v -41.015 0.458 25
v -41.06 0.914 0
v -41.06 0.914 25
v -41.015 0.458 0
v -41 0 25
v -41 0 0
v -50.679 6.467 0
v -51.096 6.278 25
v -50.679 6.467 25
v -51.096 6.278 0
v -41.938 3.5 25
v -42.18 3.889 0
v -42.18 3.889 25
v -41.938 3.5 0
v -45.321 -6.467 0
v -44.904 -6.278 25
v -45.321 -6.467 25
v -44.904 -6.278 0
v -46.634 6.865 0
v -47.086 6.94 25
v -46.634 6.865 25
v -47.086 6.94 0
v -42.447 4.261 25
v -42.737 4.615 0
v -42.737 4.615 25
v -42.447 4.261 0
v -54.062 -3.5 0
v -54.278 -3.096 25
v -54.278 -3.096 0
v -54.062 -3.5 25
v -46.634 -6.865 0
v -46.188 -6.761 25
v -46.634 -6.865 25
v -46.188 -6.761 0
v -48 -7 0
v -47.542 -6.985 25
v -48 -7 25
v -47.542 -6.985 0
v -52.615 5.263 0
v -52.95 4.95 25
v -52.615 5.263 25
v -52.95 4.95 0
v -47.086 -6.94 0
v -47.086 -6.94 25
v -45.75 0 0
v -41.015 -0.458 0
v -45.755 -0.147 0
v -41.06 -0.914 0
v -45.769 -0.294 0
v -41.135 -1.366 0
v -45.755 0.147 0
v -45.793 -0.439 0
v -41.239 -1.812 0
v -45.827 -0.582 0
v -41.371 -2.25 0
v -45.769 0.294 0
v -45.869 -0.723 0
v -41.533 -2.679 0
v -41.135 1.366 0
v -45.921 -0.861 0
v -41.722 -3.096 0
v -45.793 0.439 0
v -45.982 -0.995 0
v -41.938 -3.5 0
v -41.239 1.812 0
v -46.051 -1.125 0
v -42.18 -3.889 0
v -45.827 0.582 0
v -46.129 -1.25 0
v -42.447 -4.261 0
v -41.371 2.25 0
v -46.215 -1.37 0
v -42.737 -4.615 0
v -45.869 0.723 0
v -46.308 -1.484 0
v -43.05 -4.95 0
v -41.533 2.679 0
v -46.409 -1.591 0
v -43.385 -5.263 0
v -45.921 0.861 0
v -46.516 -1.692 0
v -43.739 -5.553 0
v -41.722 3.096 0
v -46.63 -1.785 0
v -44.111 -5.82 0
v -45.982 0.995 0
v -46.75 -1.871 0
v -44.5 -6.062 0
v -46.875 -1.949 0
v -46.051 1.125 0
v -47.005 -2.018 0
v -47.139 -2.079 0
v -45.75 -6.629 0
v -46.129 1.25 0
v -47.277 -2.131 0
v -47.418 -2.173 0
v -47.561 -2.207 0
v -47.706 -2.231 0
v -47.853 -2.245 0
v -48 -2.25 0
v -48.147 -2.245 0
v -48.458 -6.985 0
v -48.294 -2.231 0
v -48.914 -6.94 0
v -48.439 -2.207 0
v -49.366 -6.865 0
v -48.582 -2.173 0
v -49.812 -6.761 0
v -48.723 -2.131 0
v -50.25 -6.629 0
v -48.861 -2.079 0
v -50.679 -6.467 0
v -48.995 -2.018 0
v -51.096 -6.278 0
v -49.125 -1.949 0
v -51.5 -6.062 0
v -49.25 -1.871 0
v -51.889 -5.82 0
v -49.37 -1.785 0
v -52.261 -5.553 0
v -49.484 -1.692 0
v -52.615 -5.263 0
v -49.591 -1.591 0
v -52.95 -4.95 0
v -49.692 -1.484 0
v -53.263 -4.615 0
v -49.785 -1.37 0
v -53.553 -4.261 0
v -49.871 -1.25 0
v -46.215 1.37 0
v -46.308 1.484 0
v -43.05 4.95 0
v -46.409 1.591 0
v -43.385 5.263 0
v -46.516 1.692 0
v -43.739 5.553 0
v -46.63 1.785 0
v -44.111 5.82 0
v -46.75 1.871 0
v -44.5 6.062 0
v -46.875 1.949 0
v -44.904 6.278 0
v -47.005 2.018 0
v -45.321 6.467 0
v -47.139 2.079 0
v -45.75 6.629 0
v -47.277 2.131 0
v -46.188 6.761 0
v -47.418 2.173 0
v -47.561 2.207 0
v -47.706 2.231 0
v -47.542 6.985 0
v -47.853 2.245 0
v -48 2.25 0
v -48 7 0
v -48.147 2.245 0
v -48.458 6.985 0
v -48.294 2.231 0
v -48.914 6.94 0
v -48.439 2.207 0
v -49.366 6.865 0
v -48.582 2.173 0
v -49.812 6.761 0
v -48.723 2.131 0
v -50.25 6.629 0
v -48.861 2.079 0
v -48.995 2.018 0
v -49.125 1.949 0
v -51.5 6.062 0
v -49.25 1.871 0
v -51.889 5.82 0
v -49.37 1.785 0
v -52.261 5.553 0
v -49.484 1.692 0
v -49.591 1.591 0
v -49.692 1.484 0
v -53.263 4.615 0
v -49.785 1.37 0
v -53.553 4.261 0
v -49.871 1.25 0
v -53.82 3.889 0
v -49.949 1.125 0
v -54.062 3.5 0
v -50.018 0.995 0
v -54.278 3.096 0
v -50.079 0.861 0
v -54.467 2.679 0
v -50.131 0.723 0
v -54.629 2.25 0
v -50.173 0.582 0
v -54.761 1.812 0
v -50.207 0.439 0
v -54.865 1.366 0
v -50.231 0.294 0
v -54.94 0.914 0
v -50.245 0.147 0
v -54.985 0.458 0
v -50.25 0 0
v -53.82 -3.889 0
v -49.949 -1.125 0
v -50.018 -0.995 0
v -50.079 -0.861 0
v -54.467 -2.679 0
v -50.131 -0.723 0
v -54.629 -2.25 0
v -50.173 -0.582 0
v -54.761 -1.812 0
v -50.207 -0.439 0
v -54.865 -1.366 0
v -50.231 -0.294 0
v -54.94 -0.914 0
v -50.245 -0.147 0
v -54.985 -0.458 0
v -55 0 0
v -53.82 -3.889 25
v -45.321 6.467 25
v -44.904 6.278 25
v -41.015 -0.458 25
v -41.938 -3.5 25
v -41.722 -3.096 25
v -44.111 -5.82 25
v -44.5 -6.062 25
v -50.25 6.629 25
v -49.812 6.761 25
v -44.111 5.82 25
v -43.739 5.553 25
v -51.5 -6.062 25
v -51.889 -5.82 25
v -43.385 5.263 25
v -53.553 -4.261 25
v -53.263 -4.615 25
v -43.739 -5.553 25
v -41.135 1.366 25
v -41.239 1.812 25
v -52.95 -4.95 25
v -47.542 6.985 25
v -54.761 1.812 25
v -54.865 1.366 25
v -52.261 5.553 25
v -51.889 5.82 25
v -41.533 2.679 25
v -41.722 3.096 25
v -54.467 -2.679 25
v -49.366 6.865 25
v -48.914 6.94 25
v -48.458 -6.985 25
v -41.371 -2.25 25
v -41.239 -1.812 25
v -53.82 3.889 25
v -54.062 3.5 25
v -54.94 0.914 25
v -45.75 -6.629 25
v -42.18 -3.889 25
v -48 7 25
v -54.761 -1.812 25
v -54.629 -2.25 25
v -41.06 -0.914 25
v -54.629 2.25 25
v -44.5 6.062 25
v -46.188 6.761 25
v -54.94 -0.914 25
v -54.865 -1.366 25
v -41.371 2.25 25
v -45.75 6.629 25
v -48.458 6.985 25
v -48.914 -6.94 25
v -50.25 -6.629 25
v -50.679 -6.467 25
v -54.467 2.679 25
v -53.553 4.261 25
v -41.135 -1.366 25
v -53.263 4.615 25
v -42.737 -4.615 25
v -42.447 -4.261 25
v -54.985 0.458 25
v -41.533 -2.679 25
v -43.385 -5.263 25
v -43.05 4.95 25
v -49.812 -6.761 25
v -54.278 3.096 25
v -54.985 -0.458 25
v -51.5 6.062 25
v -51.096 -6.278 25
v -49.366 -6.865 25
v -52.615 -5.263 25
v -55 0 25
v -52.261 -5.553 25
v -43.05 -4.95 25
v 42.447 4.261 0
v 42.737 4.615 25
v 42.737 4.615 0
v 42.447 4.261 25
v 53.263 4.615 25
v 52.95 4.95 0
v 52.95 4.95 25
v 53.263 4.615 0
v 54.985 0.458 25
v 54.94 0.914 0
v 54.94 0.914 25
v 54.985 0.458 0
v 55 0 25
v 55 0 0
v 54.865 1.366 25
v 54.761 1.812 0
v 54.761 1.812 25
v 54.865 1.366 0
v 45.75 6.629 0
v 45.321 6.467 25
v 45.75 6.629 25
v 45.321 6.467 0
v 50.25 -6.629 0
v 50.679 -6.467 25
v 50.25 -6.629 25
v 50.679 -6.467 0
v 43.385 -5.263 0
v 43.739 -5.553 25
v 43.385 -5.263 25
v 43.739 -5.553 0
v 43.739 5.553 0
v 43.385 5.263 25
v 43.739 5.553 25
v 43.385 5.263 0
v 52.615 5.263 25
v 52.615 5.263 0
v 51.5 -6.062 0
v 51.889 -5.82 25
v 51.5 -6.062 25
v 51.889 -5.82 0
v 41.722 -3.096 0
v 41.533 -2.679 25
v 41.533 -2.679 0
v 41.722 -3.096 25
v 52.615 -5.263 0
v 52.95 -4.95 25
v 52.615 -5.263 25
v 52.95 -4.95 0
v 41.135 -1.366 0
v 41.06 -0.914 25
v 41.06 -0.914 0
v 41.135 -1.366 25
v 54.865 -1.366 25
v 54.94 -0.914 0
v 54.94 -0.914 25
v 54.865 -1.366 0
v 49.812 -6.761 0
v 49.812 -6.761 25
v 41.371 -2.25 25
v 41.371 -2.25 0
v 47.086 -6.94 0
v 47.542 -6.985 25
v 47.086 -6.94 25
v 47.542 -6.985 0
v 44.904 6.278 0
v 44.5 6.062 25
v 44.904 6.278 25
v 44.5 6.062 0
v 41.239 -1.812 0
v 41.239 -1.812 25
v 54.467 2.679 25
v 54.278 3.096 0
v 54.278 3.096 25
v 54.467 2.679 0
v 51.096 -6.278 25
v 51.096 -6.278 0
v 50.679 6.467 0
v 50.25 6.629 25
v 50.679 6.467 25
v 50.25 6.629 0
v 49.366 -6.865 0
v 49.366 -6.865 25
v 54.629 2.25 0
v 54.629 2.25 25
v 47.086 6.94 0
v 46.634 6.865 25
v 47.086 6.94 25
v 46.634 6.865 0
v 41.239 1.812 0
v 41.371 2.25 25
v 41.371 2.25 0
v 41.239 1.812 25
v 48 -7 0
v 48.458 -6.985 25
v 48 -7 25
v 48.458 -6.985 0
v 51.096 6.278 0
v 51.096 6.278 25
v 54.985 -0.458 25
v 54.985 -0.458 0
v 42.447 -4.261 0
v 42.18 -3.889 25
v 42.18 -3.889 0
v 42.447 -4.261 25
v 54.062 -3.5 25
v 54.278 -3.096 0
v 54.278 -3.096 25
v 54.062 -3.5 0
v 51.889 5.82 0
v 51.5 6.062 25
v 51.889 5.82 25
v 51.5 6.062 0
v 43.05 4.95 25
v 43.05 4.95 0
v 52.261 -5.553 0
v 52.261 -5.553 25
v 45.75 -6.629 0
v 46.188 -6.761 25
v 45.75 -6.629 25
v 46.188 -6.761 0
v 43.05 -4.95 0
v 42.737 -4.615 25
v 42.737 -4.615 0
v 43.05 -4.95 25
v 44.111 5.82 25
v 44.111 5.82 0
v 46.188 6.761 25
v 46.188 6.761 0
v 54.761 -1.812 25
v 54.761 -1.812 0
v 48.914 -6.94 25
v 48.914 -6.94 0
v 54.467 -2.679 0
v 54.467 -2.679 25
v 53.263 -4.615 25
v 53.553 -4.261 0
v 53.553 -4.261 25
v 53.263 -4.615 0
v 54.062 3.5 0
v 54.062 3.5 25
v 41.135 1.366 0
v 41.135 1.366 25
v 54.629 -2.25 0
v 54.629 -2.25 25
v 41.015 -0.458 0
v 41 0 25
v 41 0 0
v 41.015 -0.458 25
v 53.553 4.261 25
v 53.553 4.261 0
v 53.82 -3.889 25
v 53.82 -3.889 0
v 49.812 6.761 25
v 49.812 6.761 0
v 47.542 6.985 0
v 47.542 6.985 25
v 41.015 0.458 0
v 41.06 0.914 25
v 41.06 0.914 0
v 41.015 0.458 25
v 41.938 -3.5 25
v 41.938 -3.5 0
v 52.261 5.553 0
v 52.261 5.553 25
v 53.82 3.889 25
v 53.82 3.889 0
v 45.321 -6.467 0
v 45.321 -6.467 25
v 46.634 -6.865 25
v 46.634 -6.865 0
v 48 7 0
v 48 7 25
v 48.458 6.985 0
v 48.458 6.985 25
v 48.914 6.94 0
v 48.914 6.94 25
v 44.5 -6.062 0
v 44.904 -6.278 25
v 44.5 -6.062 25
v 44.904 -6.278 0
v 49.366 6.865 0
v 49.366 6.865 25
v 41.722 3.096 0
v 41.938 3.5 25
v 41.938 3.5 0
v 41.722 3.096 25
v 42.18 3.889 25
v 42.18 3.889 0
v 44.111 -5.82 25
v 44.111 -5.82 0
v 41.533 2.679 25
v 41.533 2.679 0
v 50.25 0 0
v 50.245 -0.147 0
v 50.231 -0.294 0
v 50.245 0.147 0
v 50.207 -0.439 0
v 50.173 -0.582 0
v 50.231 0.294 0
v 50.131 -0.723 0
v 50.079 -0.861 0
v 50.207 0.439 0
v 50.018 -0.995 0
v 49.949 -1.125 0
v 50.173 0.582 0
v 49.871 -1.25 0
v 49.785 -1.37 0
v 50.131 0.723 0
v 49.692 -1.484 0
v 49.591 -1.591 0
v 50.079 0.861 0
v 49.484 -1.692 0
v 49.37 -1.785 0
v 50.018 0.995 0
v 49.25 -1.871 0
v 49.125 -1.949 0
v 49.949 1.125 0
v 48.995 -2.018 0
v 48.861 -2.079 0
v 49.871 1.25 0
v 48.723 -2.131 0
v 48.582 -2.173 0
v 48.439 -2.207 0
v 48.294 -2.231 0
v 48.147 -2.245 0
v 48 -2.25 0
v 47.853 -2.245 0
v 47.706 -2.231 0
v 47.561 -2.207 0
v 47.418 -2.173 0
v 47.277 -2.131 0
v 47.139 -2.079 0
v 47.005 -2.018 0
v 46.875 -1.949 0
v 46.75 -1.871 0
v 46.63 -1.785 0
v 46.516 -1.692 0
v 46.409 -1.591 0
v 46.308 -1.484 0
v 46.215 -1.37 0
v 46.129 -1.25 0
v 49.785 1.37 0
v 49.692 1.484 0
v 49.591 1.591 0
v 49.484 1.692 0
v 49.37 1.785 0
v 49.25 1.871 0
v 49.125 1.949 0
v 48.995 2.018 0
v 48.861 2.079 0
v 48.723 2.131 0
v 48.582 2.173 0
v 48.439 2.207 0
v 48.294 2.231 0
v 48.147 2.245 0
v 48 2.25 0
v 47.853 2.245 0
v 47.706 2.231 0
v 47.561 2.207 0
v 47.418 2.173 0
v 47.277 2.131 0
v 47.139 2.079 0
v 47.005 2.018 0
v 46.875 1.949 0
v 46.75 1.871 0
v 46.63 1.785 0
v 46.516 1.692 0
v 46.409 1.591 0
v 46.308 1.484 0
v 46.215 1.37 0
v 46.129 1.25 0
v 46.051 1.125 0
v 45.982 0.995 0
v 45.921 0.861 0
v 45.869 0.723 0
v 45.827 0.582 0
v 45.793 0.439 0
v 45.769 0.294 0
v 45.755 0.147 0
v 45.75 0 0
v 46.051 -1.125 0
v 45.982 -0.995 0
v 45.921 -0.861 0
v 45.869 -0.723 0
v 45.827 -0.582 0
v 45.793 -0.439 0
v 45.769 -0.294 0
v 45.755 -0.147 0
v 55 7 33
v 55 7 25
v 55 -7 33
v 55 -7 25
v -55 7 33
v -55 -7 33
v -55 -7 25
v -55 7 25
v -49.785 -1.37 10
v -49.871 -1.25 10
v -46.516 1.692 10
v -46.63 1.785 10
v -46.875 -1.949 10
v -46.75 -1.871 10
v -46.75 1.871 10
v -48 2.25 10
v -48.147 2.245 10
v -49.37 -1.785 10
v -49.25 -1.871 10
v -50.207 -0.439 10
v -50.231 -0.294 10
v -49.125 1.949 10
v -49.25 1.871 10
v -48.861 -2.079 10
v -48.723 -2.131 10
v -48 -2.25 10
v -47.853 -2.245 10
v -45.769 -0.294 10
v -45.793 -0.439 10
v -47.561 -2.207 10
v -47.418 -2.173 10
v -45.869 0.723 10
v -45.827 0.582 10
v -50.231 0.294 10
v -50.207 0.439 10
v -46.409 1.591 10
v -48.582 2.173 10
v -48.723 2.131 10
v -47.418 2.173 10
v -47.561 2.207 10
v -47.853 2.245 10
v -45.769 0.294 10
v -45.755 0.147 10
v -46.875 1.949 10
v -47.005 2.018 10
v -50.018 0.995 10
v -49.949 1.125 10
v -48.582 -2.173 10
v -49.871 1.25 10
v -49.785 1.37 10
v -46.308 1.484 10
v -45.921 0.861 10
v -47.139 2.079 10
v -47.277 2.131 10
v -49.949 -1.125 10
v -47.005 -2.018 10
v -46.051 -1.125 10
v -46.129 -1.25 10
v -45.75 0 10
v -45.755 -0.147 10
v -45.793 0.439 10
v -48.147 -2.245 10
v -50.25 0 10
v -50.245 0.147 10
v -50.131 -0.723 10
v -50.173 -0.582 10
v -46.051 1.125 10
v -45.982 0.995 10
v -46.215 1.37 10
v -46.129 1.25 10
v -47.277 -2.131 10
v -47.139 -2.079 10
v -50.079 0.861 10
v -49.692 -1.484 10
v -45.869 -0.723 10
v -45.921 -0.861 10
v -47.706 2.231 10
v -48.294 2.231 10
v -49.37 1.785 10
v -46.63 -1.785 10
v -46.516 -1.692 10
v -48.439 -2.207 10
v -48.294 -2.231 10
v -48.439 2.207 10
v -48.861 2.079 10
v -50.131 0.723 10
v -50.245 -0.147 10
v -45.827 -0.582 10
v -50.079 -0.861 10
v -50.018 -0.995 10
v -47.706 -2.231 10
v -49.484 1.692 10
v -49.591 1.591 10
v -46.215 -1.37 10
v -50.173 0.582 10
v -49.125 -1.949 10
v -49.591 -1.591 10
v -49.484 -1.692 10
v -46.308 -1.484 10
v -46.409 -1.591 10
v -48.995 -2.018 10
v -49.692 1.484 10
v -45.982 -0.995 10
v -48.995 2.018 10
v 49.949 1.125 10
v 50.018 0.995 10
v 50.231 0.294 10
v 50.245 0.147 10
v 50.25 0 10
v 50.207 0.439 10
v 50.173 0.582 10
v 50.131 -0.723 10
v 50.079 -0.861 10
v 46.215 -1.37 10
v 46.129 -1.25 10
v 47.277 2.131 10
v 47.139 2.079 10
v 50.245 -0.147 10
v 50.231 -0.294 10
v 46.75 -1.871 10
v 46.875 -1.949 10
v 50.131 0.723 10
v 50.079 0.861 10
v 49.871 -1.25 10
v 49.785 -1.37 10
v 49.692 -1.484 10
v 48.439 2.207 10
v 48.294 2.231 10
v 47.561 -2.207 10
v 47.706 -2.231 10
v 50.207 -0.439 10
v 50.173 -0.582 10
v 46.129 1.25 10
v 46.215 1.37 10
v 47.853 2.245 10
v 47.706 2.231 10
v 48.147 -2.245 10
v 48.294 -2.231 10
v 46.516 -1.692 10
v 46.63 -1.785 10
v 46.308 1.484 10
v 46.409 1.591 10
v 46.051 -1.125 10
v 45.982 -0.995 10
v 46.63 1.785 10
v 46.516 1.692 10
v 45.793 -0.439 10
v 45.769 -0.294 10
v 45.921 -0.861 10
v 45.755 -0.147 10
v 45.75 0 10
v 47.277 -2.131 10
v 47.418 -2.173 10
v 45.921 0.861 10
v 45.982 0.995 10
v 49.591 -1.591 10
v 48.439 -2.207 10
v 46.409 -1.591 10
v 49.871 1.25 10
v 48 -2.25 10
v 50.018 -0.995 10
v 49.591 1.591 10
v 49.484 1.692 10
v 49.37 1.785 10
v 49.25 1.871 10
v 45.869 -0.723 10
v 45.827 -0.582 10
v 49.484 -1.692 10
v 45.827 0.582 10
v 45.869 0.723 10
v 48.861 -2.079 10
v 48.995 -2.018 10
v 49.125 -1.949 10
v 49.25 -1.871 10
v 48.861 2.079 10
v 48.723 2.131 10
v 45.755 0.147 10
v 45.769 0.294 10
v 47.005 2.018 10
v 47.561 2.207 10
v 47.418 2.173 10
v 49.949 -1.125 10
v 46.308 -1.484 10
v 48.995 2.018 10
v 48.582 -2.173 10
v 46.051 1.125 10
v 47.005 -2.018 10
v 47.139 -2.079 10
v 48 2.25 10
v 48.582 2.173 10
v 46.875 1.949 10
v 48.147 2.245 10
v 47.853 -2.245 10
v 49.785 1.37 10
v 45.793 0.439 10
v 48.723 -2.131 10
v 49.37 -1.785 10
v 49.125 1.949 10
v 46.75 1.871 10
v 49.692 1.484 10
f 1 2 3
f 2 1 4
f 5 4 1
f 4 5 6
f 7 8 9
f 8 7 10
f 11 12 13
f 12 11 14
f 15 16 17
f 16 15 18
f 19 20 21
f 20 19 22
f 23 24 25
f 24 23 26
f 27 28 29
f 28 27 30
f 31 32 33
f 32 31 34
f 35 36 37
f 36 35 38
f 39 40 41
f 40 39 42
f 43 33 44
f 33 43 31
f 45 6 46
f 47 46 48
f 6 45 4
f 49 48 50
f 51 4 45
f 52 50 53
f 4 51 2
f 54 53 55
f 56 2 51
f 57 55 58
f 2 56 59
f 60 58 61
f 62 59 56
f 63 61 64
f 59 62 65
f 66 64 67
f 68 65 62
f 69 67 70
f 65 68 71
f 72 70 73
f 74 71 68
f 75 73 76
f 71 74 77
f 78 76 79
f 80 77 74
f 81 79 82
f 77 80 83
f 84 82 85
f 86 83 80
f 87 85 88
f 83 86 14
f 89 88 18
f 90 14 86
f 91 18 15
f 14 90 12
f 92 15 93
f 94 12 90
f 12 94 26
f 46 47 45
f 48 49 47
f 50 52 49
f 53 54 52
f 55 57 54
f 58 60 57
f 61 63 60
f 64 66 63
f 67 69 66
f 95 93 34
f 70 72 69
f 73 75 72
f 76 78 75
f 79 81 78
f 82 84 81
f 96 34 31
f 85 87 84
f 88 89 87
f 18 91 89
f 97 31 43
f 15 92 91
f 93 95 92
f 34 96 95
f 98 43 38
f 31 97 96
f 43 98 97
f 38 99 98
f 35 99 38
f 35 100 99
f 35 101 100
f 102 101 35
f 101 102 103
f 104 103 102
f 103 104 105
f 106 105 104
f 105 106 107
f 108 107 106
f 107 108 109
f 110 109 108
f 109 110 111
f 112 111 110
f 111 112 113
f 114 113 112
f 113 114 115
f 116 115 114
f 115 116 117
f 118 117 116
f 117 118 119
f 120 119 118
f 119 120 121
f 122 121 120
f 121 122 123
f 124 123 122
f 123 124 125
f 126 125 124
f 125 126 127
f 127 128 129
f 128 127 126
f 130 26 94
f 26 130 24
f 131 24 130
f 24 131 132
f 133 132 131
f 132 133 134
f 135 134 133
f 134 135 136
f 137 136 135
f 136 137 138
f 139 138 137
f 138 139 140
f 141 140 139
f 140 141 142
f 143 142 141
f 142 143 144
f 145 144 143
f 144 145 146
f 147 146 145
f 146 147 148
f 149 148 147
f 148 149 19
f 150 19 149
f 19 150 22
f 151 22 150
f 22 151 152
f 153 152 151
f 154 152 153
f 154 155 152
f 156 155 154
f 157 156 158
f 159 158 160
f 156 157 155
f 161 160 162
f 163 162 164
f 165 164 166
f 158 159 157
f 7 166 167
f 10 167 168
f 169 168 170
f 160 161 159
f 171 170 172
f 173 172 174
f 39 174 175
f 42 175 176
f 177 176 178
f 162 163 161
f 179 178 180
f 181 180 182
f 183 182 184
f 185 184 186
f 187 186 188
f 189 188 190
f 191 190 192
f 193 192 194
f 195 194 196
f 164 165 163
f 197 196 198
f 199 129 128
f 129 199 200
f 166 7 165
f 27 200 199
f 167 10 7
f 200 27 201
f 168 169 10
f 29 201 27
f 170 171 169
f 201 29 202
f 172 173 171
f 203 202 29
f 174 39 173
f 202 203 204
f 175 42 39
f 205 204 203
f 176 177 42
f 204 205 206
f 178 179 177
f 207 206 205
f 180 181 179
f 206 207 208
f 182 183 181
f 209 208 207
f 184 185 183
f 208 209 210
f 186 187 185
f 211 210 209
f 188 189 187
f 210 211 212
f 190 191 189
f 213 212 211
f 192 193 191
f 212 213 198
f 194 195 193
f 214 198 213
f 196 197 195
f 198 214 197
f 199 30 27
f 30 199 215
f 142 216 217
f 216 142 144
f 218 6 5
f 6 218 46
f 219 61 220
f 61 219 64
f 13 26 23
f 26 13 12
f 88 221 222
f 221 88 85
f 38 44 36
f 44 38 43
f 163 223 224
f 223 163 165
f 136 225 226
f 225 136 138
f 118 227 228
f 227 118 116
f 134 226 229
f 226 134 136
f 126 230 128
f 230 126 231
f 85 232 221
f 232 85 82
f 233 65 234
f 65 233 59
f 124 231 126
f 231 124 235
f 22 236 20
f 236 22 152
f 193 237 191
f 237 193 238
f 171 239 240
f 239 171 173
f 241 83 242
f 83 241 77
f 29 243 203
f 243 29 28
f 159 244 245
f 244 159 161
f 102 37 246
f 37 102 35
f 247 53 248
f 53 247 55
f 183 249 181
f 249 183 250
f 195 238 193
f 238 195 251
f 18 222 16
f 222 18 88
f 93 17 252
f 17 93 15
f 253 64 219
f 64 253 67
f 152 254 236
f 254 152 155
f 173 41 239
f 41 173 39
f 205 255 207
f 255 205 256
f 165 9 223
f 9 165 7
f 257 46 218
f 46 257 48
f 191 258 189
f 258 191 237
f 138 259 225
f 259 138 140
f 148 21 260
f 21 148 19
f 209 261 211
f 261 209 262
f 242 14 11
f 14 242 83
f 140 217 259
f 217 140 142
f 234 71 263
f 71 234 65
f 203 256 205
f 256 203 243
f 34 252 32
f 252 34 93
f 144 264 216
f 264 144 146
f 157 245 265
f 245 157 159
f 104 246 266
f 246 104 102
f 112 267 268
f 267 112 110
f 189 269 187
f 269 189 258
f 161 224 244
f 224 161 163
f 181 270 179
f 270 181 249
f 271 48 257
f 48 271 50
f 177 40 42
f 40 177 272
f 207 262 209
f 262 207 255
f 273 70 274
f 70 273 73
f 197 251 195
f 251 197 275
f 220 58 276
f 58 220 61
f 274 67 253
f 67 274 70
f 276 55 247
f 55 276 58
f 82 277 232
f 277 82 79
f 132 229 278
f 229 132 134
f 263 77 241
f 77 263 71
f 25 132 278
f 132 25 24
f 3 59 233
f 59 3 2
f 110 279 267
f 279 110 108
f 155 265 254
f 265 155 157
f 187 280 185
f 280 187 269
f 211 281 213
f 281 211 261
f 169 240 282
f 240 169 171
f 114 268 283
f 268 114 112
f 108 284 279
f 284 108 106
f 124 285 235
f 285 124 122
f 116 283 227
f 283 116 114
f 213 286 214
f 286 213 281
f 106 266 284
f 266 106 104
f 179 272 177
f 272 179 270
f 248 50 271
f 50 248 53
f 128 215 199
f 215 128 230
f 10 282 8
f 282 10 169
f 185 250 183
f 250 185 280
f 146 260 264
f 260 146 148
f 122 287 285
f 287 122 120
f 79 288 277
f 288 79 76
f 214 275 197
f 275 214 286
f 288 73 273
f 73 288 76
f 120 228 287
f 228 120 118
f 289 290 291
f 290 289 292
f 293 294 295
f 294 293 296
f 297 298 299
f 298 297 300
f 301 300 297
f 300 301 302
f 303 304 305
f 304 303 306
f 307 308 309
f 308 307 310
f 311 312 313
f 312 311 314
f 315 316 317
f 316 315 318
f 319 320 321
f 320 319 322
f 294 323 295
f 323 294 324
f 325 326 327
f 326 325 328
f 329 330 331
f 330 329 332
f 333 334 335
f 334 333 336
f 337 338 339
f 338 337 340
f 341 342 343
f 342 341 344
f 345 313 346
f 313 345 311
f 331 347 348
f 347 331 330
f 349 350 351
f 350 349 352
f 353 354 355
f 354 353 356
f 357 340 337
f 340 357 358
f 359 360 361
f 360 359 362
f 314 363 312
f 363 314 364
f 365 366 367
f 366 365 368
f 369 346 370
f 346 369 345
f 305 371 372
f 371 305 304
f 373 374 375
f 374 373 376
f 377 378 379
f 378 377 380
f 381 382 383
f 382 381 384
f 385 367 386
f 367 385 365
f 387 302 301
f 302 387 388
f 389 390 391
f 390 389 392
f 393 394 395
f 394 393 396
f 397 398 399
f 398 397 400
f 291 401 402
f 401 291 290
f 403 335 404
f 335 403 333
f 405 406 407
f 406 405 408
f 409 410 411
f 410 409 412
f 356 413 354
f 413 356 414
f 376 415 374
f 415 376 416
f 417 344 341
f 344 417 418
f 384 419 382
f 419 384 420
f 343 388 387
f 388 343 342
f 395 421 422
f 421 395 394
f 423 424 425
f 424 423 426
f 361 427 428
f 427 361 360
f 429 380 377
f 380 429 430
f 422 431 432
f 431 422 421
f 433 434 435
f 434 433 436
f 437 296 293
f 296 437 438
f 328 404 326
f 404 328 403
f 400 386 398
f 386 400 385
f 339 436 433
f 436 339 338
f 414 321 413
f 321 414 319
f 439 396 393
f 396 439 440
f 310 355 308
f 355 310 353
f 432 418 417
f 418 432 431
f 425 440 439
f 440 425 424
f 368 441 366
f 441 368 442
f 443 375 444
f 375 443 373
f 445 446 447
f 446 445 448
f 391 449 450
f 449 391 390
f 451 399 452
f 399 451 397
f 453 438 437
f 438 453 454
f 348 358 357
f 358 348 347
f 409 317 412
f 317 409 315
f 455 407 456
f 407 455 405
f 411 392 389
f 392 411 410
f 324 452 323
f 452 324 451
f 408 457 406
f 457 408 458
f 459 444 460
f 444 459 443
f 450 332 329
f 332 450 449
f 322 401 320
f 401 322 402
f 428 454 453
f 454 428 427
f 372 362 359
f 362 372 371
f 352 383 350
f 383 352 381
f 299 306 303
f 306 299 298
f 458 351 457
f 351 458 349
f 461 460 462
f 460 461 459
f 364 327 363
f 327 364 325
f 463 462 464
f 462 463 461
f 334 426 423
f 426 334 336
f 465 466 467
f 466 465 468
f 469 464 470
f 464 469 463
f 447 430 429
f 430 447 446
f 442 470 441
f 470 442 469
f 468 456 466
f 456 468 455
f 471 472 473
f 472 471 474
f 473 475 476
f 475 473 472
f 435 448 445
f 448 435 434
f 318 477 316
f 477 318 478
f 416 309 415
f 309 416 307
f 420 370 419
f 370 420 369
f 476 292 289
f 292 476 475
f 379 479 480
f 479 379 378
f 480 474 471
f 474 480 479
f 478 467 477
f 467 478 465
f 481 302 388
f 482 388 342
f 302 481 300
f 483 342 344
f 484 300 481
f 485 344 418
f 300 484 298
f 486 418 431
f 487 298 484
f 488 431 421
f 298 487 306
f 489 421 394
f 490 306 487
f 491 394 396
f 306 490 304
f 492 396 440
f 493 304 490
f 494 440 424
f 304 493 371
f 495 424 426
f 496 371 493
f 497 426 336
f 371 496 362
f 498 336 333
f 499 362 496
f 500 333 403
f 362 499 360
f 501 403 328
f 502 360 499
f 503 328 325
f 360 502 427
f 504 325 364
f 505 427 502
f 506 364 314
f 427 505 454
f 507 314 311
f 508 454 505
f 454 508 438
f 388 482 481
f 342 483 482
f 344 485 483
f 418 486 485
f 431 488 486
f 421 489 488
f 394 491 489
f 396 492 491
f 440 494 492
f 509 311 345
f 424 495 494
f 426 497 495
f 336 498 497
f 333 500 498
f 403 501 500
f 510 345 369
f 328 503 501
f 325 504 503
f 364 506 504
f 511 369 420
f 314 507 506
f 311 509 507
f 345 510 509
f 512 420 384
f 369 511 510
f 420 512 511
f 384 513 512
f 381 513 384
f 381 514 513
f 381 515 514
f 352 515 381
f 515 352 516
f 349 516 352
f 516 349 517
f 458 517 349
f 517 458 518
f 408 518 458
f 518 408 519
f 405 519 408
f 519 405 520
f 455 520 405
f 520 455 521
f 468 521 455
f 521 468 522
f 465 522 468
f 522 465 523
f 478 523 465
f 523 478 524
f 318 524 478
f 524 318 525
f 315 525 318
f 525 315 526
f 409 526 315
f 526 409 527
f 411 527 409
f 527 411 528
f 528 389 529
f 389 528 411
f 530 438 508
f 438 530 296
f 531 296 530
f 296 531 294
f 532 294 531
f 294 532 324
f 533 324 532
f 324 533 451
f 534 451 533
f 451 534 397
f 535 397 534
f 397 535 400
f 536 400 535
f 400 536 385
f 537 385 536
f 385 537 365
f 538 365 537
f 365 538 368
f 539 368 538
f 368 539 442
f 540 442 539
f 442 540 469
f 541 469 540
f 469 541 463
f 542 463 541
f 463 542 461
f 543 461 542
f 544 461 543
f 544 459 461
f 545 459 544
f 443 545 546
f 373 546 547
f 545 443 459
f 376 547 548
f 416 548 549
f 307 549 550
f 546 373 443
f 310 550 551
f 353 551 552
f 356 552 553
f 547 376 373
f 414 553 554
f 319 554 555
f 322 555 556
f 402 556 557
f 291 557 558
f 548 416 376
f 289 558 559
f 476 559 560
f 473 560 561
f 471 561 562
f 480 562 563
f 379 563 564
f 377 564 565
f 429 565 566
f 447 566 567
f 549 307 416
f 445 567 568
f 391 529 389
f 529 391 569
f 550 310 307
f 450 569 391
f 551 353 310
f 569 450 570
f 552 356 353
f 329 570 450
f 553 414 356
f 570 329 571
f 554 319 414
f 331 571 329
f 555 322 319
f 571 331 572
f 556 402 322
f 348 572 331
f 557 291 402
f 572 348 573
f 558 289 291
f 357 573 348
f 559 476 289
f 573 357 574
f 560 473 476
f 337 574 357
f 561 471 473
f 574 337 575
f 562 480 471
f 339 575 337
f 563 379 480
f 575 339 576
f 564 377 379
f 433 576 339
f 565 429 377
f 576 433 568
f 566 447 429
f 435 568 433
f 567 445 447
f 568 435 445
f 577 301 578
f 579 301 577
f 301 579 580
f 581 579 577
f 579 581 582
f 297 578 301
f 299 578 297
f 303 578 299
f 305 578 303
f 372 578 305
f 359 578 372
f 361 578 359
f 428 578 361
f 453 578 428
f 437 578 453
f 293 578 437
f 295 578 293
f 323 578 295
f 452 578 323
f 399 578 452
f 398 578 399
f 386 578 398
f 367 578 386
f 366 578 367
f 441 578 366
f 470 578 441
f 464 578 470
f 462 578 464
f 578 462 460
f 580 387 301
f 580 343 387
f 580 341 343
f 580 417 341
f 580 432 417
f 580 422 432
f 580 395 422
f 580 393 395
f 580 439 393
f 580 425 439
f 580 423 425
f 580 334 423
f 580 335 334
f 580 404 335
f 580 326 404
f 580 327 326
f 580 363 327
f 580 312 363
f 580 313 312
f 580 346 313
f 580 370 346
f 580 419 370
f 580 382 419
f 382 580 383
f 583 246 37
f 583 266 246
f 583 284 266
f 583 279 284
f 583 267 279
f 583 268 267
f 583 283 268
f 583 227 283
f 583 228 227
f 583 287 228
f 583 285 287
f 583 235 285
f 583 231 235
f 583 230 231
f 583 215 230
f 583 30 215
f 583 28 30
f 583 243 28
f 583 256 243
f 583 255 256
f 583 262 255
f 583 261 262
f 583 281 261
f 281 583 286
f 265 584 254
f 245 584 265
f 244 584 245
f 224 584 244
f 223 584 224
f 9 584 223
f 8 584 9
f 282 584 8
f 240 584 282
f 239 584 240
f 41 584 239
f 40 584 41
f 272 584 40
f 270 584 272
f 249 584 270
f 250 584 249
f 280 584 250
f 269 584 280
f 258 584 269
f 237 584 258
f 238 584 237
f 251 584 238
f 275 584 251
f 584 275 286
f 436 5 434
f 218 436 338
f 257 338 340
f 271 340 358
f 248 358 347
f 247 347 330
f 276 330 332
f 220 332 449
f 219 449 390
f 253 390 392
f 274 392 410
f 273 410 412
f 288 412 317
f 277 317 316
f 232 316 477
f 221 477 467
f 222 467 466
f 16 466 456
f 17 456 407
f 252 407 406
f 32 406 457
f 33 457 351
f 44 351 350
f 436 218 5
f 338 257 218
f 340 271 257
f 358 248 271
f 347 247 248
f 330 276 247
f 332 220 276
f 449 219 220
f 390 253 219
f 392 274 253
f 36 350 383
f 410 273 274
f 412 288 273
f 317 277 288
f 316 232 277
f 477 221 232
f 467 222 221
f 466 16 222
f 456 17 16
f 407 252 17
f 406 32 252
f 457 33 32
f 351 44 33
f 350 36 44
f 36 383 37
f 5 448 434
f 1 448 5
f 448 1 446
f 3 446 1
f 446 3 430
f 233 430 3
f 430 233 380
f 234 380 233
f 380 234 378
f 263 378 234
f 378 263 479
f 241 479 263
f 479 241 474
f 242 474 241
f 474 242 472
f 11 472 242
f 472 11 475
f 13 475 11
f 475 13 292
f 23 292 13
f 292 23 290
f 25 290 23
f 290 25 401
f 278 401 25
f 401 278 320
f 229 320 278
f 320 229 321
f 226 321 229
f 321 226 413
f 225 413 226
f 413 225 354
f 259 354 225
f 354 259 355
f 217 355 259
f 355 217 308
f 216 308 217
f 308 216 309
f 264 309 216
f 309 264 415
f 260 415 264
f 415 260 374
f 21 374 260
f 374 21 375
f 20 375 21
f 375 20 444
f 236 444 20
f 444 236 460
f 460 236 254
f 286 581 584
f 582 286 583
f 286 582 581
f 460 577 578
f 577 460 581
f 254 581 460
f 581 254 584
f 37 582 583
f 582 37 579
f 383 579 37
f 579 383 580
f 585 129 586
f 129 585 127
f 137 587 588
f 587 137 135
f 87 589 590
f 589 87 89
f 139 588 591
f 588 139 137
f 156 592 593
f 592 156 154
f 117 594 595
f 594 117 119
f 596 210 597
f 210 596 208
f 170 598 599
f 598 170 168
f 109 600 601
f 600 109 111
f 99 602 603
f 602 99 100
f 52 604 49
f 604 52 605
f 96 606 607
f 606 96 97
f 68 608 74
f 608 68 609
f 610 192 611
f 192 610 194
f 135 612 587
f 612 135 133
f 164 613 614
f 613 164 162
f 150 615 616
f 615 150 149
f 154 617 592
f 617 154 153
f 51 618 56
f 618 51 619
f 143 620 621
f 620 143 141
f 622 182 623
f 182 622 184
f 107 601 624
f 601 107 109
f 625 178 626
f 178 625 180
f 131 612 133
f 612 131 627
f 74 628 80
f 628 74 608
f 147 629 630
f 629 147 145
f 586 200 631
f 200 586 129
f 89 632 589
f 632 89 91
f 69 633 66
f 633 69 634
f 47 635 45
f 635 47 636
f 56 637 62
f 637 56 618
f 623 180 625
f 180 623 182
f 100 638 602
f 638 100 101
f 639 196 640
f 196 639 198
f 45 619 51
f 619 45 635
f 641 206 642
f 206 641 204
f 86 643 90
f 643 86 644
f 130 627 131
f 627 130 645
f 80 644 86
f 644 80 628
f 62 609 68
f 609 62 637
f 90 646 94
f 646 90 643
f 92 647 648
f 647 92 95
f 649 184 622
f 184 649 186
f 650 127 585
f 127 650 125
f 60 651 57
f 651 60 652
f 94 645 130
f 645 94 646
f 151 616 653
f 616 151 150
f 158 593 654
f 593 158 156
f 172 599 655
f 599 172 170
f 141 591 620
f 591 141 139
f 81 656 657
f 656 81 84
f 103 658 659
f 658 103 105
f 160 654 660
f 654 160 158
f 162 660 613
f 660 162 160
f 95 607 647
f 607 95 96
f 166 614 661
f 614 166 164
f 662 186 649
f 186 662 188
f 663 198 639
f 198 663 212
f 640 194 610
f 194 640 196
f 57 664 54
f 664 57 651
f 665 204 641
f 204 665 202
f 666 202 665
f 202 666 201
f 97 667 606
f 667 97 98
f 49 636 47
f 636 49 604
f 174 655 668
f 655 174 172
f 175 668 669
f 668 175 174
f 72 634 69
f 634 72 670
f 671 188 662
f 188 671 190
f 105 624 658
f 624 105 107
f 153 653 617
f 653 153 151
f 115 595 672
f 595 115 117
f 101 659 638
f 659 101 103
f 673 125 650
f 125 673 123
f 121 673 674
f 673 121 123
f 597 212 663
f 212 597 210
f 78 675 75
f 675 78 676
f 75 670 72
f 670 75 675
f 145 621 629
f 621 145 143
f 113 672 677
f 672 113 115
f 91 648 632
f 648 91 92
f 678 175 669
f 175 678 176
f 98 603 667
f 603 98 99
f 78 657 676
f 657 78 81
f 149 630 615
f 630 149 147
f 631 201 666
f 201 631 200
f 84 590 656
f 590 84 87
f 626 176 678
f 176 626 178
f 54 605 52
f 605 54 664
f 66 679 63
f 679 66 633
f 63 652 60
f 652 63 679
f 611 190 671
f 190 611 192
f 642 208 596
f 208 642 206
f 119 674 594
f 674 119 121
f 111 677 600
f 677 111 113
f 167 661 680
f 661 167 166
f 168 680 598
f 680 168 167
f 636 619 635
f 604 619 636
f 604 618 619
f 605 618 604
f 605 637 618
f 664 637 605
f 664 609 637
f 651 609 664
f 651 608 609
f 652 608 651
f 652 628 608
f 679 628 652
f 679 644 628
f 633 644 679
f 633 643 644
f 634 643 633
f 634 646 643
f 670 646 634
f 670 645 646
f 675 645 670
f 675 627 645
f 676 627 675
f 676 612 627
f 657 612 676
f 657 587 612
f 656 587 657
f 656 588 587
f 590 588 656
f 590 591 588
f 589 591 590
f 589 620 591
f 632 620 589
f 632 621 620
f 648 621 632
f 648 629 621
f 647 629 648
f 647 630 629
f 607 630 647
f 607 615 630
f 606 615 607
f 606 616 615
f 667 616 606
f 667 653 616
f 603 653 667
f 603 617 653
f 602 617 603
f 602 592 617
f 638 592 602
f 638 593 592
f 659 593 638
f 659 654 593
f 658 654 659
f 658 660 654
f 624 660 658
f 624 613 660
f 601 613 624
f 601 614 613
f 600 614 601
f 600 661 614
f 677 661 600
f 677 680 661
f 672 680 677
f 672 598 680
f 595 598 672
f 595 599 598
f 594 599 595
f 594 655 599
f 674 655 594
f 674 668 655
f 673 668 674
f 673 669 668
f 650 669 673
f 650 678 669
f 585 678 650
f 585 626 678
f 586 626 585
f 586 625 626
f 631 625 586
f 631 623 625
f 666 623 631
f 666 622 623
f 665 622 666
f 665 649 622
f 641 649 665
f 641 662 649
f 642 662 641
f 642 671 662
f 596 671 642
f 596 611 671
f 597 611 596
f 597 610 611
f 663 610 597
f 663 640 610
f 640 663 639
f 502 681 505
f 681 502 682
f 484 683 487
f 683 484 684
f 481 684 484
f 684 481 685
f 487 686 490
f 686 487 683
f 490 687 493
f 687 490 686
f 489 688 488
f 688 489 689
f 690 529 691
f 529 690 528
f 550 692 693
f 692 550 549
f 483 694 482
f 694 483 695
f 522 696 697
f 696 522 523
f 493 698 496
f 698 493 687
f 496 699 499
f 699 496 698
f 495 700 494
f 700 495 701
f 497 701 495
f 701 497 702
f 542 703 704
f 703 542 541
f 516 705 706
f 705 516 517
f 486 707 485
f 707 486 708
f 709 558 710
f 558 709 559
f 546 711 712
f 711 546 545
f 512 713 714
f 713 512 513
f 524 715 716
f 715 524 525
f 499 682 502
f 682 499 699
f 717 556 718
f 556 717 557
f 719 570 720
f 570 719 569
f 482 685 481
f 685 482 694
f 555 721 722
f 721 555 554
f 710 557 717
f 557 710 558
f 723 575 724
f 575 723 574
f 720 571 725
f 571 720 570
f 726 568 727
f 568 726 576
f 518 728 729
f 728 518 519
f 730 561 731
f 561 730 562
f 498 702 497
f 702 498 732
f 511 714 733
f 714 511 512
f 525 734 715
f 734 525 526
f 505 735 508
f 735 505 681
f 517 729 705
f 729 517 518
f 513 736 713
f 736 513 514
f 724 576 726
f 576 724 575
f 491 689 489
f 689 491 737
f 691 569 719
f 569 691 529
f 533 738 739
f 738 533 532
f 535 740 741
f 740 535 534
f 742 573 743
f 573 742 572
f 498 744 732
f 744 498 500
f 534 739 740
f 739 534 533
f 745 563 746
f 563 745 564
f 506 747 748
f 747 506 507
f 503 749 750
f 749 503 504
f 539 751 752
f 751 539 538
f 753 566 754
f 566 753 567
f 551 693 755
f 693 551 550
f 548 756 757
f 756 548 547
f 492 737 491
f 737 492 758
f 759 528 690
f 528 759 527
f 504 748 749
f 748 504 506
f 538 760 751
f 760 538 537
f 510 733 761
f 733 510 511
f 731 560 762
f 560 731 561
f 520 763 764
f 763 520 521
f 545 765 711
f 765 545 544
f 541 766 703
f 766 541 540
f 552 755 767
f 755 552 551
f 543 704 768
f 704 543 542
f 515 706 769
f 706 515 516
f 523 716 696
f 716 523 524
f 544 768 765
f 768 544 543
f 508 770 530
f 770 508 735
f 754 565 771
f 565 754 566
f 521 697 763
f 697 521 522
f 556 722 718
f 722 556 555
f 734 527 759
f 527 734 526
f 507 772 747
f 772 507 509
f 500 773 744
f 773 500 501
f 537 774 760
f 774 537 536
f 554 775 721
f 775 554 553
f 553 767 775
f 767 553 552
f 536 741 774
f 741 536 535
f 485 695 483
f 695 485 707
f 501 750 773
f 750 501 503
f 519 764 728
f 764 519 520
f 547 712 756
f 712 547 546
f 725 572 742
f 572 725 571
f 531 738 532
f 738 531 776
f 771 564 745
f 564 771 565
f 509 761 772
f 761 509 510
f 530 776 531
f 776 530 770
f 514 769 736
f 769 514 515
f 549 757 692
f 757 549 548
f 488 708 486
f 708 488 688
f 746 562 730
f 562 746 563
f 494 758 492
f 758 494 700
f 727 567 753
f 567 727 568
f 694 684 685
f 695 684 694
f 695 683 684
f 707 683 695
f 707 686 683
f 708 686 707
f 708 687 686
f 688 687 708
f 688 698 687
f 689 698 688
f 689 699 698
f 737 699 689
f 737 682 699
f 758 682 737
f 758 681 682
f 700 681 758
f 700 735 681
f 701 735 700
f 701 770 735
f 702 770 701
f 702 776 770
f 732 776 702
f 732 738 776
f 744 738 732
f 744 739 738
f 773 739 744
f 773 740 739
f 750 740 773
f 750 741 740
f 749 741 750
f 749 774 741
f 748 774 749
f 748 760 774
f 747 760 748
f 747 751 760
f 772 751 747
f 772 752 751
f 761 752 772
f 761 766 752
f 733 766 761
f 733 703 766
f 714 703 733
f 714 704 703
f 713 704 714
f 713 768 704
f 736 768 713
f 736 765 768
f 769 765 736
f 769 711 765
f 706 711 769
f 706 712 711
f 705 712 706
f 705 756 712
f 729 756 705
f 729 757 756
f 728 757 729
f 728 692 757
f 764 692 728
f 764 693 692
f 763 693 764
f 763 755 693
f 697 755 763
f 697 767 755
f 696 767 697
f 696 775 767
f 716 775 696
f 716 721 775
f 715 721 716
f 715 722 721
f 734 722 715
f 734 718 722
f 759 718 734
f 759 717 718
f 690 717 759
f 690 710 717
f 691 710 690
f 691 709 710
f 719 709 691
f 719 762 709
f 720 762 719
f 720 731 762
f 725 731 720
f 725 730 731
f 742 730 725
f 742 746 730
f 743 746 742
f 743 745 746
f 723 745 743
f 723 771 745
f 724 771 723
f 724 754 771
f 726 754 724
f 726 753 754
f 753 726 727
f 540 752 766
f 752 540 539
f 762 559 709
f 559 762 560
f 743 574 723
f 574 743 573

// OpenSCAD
// Cabinet door pull handle
// Print orientation: posts on the bed (z = 0), bar on top (z = 25 to 33)

// ---------- Parameters ----------
post_d        = 14;    // post diameter
post_h        = 25;    // post height (z = 0 to 25)
post_x        = 48;    // post axis offset from origin in X (+/-)

bar_len       = 110;   // bar length (X)
bar_w         = 14;    // bar width (Y)
bar_t         = 8;     // bar thickness (Z), from z = 25 to 33

screw_d       = 4.5;   // screw hole diameter
screw_depth   = 10;    // screw hole depth from bottom face

eps           = 0.5;   // overlap / overshoot for clean booleans
$fn           = 96;    // curve resolution

// ---------- Model ----------
difference() {
    union() {
        // Posts
        for (sx = [-1, 1])
            translate([sx * post_x, 0, 0])
                cylinder(d = post_d, h = post_h + eps);  // small overlap into bar

        // Bar
        translate([-bar_len / 2, -bar_w / 2, post_h])
            cube([bar_len, bar_w, bar_t]);
    }

    // Screw holes up each post axis from the bottom face
    for (sx = [-1, 1])
        translate([sx * post_x, 0, -eps])
            cylinder(d = screw_d, h = screw_depth + eps);
}
